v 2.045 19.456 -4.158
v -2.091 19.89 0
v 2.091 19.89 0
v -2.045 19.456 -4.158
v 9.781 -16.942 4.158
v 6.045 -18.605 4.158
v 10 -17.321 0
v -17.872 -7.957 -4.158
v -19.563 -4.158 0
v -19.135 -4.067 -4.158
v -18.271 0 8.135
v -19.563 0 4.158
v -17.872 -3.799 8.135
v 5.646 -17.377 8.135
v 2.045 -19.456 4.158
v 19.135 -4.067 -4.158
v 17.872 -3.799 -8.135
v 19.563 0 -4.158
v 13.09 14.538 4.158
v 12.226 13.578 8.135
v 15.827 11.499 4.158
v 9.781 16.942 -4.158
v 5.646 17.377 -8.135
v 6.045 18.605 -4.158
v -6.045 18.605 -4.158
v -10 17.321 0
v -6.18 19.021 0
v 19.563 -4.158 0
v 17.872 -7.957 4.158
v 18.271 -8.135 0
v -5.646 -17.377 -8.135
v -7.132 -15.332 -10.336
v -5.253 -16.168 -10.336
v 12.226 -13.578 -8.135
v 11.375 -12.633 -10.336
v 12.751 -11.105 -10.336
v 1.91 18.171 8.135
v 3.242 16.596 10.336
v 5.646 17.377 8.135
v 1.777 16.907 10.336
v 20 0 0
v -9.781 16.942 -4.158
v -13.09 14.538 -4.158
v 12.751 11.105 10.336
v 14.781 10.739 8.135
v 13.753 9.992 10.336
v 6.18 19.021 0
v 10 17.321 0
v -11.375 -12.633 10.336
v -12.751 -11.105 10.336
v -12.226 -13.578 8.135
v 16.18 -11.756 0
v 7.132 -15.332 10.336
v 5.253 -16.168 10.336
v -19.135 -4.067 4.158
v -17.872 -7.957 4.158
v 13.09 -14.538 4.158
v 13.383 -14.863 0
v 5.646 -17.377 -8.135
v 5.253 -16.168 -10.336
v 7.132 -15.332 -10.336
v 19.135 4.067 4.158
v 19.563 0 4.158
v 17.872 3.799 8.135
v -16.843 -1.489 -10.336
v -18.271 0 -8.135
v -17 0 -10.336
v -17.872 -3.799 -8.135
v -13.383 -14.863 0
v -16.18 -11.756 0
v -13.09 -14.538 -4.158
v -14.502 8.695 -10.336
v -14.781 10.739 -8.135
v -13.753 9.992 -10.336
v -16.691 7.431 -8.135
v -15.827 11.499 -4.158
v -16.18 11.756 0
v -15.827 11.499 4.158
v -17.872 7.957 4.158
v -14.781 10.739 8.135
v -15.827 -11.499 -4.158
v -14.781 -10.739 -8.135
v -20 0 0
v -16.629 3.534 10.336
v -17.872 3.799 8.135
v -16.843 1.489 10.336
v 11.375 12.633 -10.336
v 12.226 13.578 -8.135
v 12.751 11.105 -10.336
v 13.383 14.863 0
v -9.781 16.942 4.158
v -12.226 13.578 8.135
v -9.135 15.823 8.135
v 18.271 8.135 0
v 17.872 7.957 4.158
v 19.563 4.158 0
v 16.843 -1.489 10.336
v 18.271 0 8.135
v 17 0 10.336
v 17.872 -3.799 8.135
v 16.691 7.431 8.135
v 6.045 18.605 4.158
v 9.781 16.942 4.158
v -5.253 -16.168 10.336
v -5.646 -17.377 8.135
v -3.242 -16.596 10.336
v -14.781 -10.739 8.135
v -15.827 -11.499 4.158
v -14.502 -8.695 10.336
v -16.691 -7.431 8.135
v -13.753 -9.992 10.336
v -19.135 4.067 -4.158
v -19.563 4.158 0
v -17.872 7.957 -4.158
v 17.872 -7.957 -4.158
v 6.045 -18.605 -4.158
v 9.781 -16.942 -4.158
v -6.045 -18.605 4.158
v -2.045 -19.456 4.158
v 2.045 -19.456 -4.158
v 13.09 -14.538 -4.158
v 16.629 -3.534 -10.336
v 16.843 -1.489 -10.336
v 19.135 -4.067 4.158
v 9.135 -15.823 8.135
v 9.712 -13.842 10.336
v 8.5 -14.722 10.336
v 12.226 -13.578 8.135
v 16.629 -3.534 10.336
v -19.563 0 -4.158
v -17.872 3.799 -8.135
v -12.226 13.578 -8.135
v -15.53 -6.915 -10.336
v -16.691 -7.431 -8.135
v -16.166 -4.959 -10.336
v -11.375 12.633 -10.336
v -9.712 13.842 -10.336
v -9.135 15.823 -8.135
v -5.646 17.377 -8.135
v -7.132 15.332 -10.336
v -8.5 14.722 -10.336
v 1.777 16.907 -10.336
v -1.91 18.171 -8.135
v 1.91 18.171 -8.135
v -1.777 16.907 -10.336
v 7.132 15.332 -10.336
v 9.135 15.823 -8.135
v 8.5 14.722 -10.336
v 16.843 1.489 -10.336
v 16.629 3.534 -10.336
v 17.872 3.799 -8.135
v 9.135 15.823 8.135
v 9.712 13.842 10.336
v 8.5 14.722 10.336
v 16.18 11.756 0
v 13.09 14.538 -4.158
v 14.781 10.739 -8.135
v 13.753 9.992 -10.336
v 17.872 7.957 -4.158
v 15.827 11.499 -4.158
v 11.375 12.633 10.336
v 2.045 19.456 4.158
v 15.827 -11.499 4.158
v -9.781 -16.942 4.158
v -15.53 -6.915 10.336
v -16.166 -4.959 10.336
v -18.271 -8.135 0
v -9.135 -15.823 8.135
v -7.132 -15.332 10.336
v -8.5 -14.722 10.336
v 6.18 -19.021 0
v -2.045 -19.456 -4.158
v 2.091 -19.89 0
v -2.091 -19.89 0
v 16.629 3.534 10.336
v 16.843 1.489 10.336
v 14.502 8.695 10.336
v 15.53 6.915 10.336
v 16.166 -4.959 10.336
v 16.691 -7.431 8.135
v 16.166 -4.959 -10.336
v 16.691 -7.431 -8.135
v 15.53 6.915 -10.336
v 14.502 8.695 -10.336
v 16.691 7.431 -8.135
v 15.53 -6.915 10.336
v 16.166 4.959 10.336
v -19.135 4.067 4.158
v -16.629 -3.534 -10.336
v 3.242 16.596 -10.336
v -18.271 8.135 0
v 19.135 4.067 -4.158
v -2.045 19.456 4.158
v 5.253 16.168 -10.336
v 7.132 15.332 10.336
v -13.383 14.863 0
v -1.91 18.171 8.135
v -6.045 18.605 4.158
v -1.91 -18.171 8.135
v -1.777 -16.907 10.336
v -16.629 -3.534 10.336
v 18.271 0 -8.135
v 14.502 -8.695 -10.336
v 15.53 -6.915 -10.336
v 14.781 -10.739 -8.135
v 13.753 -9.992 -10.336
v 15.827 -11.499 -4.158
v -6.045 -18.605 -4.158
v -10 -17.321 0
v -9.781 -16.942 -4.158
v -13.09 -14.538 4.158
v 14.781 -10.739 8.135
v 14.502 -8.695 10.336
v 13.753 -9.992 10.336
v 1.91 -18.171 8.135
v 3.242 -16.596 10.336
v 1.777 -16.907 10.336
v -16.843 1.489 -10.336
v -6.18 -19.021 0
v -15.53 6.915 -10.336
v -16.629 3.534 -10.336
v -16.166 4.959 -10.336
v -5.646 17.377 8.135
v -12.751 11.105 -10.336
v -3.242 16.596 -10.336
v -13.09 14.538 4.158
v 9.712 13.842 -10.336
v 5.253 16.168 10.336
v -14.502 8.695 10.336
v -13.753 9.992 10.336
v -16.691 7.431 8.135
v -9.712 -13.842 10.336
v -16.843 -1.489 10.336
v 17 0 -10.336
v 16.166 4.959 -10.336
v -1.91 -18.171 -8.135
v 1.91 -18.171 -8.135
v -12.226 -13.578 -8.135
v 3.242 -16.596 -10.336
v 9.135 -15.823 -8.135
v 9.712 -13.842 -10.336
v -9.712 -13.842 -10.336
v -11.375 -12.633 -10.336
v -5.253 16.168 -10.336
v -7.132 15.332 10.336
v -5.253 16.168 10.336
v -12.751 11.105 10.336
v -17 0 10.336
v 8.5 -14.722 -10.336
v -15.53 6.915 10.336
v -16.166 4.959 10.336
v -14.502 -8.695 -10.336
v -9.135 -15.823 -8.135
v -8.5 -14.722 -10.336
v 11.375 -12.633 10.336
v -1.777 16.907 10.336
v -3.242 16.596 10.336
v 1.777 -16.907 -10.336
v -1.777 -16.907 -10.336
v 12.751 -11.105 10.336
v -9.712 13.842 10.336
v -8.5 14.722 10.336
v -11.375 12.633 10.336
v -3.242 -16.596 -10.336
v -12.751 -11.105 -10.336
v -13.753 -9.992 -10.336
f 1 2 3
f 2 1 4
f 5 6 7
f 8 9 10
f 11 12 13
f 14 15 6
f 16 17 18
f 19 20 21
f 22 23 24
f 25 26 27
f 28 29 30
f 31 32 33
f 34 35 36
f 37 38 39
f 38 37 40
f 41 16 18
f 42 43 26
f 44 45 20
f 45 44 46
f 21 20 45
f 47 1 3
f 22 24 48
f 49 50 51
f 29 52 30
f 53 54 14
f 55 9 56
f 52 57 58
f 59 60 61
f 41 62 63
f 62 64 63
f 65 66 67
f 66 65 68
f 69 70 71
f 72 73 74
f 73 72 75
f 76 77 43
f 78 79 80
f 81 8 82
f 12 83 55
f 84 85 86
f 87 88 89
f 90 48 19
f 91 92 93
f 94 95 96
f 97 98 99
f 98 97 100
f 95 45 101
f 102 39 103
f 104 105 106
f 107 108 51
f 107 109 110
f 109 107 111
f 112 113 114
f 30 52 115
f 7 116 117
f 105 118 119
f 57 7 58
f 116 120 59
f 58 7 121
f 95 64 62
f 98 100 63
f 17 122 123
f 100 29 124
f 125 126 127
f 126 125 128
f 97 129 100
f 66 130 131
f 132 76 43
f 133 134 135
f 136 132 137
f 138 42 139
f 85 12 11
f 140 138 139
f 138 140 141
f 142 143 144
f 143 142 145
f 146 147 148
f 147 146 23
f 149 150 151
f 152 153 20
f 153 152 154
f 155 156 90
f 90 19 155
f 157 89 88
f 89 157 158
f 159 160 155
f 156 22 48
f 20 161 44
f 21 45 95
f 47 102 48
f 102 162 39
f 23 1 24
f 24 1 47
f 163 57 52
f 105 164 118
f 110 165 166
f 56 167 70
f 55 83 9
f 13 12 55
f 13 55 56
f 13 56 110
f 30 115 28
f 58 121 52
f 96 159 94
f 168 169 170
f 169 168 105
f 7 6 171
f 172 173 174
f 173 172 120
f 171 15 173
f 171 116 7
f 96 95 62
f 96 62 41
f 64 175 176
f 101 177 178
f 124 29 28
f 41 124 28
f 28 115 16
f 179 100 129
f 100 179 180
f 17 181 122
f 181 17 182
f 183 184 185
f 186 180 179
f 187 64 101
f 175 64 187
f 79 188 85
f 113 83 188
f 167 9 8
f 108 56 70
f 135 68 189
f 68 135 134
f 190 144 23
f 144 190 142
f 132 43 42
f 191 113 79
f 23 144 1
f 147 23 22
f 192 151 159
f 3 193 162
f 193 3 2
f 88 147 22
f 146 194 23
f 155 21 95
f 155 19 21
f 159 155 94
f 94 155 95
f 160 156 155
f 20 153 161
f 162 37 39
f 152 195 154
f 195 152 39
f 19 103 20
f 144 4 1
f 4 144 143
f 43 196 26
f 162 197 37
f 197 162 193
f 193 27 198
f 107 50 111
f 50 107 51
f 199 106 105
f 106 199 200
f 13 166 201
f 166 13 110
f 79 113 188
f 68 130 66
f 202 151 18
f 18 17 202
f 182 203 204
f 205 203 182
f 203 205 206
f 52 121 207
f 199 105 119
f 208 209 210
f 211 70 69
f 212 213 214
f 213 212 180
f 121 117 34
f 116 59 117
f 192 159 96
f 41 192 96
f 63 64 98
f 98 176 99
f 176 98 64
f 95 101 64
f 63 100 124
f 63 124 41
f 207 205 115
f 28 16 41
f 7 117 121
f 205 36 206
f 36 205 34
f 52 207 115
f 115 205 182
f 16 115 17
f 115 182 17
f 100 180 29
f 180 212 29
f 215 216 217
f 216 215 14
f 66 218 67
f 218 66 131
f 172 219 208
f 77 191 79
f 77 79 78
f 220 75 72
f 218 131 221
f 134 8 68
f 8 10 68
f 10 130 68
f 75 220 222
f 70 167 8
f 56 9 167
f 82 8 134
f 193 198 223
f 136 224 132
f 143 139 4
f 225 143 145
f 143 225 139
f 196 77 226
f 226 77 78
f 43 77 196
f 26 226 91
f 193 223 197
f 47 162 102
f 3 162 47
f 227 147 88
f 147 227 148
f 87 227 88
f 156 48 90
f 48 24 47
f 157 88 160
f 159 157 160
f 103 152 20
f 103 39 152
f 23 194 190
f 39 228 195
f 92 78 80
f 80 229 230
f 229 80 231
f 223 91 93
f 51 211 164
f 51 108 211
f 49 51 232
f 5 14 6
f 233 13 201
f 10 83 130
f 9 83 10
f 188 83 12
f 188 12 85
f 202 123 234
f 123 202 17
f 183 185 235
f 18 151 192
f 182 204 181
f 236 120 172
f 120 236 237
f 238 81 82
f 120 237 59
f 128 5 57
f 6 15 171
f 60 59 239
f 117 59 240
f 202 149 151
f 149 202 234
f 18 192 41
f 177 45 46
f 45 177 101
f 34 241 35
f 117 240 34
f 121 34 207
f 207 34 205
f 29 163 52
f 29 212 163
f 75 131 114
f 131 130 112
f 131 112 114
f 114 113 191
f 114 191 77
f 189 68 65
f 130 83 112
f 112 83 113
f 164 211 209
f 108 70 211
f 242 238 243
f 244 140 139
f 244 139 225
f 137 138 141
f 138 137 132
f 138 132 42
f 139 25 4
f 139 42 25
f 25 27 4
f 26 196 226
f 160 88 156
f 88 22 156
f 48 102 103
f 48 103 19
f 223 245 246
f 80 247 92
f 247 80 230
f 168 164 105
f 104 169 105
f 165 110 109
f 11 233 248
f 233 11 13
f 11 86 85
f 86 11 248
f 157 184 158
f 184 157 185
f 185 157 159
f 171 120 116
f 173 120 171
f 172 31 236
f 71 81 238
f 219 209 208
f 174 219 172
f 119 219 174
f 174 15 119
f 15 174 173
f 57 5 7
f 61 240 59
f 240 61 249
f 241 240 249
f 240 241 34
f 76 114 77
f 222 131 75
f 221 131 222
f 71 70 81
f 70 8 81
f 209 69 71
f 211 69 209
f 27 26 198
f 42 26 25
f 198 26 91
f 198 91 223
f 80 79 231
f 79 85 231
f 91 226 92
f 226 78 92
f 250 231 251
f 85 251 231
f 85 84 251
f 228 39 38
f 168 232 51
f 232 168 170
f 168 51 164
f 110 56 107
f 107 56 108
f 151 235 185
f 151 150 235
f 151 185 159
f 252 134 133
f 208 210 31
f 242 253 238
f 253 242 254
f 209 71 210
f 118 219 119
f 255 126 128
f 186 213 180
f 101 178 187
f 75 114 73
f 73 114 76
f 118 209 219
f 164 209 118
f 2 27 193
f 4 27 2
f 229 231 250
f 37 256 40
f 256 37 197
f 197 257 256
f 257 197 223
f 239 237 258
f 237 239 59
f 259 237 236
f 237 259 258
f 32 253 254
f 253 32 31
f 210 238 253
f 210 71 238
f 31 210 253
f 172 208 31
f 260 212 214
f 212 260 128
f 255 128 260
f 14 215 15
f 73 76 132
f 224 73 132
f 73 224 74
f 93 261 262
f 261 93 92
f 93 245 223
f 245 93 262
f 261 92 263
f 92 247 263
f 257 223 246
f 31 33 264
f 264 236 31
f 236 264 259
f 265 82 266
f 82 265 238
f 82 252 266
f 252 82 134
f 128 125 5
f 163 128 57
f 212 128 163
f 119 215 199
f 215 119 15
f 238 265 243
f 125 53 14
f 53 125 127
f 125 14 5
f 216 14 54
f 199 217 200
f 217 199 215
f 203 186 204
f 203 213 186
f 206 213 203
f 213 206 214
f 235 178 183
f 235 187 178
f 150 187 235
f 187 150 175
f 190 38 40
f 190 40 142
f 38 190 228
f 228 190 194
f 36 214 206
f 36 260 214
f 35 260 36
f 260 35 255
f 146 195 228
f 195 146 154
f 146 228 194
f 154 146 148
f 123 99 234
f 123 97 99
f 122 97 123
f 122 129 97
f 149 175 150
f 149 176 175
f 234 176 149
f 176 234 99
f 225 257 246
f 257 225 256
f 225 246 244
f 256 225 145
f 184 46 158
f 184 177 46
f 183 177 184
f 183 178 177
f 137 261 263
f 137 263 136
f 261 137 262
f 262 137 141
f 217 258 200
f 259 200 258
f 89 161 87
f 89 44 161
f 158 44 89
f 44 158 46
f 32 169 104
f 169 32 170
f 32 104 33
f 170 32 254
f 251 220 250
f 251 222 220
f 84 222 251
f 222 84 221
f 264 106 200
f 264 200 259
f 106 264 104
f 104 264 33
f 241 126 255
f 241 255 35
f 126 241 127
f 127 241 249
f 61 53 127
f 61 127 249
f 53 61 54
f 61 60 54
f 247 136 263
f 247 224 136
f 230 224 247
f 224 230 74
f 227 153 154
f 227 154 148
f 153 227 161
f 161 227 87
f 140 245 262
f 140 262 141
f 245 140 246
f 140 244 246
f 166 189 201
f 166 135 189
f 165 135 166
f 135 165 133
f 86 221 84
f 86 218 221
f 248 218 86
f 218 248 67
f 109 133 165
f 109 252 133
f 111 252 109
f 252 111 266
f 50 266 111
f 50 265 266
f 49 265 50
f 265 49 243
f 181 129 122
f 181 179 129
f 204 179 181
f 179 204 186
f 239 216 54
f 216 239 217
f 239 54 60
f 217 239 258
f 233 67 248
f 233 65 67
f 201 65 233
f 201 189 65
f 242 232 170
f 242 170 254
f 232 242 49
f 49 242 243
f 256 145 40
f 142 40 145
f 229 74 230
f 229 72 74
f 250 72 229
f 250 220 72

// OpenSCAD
difference() {
sphere(20);
cylinder(r=17, h=100, center = true);
}
